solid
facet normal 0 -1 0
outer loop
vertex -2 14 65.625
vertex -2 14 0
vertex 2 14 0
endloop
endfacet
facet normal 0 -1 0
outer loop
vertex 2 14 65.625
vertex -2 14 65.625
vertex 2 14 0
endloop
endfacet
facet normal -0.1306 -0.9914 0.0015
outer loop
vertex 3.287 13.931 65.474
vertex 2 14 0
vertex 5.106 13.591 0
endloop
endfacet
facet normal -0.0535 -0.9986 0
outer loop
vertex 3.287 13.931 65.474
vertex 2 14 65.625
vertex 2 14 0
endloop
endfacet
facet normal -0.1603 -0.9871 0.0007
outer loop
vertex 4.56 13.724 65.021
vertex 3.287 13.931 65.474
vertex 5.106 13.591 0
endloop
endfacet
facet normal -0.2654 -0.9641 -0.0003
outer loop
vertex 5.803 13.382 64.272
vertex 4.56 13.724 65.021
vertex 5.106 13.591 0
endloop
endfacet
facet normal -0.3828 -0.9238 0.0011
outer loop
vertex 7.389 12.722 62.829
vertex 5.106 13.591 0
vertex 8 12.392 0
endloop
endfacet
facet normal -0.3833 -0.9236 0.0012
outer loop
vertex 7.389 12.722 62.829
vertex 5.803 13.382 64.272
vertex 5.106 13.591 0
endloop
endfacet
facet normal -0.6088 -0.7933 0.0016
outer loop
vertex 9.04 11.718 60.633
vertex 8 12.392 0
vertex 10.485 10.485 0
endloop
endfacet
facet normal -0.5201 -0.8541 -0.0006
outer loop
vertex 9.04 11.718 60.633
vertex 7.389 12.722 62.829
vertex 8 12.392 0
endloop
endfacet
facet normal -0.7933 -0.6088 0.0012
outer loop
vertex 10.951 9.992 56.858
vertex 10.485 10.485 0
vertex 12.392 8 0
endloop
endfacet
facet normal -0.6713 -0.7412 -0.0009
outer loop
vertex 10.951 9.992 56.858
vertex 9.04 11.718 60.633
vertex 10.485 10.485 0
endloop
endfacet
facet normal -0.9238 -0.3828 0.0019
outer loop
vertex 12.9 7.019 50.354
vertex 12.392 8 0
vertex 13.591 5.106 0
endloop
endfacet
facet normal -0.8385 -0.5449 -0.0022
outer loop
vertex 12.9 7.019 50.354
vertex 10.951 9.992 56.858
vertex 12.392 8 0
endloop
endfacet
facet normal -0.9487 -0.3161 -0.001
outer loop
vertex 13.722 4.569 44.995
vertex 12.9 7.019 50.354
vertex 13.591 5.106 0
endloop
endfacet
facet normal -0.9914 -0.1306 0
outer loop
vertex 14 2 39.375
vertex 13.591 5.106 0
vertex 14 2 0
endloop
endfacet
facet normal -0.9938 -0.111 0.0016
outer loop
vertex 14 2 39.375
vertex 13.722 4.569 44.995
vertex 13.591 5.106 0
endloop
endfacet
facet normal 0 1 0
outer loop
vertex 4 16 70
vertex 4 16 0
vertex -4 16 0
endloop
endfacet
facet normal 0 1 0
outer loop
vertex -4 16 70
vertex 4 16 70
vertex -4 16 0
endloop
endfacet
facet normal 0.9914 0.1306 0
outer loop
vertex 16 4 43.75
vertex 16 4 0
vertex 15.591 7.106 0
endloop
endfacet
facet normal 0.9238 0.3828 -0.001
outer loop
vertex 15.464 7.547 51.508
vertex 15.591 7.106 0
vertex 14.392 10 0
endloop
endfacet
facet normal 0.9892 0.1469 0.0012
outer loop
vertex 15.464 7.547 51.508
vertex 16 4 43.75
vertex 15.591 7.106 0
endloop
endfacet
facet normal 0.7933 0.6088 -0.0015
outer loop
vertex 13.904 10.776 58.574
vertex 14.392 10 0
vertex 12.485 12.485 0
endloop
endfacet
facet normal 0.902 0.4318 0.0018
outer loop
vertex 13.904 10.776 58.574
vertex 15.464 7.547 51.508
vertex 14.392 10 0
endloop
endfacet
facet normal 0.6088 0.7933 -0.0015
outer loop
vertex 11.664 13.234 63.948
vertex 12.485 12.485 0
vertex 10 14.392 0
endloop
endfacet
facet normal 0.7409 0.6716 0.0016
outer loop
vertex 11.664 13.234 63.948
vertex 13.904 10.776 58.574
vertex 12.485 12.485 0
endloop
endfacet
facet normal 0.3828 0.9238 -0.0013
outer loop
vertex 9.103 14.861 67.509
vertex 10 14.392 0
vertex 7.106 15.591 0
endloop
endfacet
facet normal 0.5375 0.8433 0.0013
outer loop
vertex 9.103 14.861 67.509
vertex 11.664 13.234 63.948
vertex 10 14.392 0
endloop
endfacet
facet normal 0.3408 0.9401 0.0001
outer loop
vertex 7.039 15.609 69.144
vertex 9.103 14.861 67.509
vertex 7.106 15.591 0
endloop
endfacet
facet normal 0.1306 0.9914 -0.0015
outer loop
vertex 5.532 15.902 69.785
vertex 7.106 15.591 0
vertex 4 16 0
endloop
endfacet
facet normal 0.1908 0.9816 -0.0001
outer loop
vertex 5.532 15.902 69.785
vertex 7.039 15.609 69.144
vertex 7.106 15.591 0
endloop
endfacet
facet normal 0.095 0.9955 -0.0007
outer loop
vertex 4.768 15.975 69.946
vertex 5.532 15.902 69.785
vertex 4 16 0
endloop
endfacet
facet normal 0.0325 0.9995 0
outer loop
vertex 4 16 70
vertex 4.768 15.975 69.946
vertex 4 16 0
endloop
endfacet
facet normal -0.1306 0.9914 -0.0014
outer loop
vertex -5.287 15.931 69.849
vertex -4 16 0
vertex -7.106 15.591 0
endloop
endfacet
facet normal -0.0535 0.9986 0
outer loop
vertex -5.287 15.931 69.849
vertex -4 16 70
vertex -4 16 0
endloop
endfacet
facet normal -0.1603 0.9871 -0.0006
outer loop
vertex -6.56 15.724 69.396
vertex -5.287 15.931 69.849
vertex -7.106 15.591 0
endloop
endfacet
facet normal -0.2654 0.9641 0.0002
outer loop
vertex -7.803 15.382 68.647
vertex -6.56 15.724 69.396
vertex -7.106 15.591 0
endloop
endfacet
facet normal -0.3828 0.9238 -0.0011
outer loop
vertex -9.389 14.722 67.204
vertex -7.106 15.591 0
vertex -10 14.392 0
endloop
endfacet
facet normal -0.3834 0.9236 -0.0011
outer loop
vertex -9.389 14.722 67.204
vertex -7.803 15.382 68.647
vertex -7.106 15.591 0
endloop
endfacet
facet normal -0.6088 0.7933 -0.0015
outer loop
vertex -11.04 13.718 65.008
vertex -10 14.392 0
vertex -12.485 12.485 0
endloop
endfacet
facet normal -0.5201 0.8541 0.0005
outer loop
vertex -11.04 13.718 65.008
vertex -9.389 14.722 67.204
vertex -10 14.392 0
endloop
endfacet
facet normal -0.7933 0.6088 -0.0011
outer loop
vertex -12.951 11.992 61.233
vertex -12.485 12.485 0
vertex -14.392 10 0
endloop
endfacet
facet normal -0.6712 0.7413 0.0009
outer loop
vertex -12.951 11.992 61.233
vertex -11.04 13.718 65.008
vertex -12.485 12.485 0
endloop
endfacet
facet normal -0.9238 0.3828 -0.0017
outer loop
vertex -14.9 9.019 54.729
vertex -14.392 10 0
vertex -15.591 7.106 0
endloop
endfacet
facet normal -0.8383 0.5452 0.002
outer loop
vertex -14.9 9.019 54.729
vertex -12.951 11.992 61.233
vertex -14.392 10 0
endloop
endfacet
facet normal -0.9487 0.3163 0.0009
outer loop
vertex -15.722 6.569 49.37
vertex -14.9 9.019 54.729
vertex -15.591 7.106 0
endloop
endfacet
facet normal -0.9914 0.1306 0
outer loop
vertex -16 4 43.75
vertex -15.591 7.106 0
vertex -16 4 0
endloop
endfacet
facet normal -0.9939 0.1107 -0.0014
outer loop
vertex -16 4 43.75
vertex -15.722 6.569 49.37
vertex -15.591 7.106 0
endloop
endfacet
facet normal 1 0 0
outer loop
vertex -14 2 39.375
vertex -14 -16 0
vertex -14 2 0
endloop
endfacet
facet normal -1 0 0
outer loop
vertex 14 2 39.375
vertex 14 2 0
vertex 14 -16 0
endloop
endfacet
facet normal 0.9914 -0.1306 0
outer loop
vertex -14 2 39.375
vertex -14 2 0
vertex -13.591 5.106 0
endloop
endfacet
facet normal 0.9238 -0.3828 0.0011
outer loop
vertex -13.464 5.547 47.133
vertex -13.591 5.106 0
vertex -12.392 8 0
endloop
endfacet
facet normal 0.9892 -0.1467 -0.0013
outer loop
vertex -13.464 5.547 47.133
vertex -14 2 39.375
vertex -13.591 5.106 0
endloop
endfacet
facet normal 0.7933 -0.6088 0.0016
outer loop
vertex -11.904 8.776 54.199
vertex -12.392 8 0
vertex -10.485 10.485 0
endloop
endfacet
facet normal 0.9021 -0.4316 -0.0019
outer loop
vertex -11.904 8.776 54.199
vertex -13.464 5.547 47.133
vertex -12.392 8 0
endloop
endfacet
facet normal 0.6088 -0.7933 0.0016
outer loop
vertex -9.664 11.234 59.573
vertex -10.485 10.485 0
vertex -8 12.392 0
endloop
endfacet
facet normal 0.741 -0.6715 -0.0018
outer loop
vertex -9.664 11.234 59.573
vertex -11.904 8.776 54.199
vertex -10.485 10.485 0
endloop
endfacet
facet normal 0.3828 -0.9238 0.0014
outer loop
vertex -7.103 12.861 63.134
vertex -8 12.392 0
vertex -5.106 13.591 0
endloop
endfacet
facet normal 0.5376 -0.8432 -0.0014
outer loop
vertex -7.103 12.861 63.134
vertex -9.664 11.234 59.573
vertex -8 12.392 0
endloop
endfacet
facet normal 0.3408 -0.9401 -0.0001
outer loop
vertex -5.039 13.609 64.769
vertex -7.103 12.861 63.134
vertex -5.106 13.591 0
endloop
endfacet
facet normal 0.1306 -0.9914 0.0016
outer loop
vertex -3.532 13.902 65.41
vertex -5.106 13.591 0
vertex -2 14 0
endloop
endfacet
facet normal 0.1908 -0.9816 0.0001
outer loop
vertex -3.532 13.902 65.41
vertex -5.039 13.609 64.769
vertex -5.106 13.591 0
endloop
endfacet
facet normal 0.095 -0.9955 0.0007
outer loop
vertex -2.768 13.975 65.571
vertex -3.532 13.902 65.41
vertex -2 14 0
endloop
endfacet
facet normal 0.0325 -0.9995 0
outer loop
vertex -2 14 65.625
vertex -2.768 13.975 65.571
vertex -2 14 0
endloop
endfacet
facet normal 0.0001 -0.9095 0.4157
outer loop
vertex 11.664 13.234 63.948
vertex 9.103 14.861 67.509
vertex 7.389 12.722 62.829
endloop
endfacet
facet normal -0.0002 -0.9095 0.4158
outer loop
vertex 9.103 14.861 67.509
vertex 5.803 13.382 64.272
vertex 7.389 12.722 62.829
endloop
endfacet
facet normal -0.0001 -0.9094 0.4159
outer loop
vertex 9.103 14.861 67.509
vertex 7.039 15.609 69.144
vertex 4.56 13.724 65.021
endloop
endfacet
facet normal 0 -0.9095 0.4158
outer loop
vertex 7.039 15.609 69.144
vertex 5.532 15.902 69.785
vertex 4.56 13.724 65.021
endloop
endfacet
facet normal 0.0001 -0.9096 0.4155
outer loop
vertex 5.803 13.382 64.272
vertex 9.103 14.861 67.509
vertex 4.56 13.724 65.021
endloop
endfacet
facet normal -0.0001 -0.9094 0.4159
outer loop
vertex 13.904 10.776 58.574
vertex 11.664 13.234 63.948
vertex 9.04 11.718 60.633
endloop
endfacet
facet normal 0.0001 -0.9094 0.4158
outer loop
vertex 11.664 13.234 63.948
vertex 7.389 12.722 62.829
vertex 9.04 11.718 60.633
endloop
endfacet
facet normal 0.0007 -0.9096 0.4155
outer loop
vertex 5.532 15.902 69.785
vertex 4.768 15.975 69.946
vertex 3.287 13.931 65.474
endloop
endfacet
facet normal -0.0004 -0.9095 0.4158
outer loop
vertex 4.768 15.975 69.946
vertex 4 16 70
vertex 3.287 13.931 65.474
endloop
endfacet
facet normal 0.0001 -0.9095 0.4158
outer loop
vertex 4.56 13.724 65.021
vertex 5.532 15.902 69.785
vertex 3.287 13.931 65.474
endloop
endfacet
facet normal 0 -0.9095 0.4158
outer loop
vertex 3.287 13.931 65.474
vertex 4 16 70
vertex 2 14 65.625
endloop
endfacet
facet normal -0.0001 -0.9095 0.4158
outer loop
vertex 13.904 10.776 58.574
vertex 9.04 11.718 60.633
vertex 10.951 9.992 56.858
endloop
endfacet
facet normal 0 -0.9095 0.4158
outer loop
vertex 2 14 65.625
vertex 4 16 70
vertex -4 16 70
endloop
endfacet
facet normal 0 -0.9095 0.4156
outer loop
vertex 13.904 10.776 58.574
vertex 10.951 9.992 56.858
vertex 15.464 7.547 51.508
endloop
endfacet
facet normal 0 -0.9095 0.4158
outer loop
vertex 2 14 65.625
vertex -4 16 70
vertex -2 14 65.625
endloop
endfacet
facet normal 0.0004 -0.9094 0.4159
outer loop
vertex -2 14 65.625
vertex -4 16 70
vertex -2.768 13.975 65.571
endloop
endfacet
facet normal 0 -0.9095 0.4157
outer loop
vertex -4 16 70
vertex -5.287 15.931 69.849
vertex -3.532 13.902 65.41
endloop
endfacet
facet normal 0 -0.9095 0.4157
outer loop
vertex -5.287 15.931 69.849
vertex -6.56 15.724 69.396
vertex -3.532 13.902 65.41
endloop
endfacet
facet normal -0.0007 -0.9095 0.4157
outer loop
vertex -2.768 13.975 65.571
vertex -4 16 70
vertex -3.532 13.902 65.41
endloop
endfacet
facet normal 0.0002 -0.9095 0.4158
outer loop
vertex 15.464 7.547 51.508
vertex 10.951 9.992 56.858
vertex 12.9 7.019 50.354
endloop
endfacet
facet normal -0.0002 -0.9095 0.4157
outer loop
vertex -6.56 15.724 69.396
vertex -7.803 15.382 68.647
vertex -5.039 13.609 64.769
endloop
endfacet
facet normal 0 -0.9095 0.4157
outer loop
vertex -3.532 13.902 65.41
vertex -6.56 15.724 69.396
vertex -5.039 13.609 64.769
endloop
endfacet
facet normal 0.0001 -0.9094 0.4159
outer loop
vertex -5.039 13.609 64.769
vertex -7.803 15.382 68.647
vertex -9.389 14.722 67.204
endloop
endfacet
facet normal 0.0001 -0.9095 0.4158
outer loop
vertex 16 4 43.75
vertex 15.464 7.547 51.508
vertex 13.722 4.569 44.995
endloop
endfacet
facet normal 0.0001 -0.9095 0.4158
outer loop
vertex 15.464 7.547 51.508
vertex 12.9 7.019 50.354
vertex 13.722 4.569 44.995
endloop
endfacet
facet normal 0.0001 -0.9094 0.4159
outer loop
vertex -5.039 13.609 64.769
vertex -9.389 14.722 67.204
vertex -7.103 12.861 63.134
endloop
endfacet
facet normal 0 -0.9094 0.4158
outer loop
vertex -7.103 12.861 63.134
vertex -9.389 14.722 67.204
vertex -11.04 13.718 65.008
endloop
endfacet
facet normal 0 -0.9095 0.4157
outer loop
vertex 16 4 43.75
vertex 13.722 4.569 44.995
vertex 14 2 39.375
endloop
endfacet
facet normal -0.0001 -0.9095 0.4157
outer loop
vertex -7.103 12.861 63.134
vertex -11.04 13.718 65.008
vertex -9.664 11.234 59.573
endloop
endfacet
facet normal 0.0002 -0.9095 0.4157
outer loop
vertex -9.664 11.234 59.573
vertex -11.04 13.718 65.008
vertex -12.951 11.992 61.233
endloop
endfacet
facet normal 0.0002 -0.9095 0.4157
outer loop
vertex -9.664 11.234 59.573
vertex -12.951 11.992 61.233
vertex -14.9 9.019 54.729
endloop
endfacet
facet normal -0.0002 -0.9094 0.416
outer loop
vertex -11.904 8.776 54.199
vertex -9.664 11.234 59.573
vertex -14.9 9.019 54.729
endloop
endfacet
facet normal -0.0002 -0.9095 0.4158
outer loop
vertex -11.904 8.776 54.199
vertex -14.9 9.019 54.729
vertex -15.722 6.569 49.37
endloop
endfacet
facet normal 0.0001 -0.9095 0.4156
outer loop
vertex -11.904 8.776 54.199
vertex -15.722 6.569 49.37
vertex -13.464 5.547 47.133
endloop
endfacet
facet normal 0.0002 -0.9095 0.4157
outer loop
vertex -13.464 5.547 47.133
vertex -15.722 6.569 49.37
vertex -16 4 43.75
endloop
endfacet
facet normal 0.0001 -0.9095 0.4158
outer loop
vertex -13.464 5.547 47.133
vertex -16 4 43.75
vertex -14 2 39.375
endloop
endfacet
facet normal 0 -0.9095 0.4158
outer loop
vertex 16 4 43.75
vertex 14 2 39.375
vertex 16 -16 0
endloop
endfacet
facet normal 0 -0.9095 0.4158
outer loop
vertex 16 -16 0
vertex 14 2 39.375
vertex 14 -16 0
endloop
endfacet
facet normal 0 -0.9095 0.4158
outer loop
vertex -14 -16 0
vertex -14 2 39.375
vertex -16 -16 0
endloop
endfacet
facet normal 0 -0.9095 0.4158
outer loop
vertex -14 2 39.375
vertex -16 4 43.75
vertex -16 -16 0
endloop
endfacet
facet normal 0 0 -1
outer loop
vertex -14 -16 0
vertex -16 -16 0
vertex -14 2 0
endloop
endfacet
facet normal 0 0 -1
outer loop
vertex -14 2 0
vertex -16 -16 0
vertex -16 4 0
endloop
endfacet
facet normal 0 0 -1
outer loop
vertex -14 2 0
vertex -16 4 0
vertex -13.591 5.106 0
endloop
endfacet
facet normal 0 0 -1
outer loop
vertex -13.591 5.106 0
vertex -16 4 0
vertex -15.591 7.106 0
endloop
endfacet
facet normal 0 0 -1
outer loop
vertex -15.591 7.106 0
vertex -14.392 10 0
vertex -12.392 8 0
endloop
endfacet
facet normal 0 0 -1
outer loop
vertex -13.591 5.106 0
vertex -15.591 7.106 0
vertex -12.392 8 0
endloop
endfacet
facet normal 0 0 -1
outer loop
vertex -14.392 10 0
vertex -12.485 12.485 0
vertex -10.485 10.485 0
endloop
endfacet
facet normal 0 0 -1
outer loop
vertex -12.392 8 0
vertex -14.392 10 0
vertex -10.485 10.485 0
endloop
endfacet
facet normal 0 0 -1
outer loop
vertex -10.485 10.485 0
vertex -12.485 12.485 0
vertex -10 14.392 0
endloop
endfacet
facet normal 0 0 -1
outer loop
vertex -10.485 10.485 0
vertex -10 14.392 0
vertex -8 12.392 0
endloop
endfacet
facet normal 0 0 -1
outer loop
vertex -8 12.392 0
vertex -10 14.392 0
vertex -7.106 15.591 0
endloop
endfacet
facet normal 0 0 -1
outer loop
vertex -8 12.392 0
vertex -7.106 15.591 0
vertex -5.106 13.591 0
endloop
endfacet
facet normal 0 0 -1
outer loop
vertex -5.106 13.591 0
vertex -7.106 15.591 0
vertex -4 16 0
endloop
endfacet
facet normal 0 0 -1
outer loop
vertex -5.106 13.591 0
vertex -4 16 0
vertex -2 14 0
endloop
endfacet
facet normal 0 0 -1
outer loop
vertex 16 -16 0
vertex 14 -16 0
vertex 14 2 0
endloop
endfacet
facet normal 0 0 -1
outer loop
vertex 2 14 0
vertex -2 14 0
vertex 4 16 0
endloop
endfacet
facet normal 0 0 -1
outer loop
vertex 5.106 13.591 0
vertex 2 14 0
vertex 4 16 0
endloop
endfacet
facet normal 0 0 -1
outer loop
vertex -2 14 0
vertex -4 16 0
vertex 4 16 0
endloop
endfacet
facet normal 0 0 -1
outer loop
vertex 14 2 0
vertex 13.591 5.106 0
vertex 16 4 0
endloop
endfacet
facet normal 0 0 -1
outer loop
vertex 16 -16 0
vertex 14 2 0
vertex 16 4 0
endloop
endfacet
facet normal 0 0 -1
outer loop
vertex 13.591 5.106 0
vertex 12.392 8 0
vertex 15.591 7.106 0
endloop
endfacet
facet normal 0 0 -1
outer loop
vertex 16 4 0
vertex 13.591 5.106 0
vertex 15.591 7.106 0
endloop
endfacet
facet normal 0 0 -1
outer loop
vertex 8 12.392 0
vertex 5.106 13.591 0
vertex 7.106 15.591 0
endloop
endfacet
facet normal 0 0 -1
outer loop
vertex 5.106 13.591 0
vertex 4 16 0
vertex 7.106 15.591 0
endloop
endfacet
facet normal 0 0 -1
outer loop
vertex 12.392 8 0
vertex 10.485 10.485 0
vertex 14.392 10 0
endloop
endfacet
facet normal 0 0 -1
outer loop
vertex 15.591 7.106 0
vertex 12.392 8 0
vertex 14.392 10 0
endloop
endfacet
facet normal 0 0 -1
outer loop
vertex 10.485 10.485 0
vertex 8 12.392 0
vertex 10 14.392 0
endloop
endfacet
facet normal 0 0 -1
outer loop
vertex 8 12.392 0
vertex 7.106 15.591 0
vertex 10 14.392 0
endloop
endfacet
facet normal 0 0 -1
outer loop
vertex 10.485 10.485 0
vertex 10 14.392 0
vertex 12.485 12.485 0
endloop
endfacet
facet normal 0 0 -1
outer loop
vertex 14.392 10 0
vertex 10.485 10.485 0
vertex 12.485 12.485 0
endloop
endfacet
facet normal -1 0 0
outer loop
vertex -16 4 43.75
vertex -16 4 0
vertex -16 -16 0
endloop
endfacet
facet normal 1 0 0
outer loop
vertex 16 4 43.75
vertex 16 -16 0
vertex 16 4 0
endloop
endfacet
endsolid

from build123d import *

# Parameters (mm, degrees)
F1_DEPTH = 70
F3_DEPTH = 33
F4_R     = 12


with BuildPart() as f1:
    # F0 (on Top) → F1 (new body)
    with BuildSketch(Plane.XY):
        Polygon((14, -16), (16, -16), (16, 16), (-16, 16), (-16, -16), (-14, -16), (-14, 14), (14, 14), align=None)
    extrude(amount=F1_DEPTH)

    # F2 (on face) → F3 (cut)
    with BuildSketch(Plane(origin=(-16, 0, 0), x_dir=(0, -1, 0), z_dir=(-1, 0, 0))):
        Polygon((16, 70), (-16, 70), (16, 0), align=None)
    extrude(amount=-F3_DEPTH, mode=Mode.SUBTRACT)

    # F4
    f4_edges = [f1.edges().sort_by_distance(p)[0] for p in [
        (16, 16, 35),
        (-16, 16, 35),
        (-14, 14, 32.8125),
        (14, 14, 32.8125),
    ]]
    fillet(f4_edges, radius=F4_R)


solid = f1.part
